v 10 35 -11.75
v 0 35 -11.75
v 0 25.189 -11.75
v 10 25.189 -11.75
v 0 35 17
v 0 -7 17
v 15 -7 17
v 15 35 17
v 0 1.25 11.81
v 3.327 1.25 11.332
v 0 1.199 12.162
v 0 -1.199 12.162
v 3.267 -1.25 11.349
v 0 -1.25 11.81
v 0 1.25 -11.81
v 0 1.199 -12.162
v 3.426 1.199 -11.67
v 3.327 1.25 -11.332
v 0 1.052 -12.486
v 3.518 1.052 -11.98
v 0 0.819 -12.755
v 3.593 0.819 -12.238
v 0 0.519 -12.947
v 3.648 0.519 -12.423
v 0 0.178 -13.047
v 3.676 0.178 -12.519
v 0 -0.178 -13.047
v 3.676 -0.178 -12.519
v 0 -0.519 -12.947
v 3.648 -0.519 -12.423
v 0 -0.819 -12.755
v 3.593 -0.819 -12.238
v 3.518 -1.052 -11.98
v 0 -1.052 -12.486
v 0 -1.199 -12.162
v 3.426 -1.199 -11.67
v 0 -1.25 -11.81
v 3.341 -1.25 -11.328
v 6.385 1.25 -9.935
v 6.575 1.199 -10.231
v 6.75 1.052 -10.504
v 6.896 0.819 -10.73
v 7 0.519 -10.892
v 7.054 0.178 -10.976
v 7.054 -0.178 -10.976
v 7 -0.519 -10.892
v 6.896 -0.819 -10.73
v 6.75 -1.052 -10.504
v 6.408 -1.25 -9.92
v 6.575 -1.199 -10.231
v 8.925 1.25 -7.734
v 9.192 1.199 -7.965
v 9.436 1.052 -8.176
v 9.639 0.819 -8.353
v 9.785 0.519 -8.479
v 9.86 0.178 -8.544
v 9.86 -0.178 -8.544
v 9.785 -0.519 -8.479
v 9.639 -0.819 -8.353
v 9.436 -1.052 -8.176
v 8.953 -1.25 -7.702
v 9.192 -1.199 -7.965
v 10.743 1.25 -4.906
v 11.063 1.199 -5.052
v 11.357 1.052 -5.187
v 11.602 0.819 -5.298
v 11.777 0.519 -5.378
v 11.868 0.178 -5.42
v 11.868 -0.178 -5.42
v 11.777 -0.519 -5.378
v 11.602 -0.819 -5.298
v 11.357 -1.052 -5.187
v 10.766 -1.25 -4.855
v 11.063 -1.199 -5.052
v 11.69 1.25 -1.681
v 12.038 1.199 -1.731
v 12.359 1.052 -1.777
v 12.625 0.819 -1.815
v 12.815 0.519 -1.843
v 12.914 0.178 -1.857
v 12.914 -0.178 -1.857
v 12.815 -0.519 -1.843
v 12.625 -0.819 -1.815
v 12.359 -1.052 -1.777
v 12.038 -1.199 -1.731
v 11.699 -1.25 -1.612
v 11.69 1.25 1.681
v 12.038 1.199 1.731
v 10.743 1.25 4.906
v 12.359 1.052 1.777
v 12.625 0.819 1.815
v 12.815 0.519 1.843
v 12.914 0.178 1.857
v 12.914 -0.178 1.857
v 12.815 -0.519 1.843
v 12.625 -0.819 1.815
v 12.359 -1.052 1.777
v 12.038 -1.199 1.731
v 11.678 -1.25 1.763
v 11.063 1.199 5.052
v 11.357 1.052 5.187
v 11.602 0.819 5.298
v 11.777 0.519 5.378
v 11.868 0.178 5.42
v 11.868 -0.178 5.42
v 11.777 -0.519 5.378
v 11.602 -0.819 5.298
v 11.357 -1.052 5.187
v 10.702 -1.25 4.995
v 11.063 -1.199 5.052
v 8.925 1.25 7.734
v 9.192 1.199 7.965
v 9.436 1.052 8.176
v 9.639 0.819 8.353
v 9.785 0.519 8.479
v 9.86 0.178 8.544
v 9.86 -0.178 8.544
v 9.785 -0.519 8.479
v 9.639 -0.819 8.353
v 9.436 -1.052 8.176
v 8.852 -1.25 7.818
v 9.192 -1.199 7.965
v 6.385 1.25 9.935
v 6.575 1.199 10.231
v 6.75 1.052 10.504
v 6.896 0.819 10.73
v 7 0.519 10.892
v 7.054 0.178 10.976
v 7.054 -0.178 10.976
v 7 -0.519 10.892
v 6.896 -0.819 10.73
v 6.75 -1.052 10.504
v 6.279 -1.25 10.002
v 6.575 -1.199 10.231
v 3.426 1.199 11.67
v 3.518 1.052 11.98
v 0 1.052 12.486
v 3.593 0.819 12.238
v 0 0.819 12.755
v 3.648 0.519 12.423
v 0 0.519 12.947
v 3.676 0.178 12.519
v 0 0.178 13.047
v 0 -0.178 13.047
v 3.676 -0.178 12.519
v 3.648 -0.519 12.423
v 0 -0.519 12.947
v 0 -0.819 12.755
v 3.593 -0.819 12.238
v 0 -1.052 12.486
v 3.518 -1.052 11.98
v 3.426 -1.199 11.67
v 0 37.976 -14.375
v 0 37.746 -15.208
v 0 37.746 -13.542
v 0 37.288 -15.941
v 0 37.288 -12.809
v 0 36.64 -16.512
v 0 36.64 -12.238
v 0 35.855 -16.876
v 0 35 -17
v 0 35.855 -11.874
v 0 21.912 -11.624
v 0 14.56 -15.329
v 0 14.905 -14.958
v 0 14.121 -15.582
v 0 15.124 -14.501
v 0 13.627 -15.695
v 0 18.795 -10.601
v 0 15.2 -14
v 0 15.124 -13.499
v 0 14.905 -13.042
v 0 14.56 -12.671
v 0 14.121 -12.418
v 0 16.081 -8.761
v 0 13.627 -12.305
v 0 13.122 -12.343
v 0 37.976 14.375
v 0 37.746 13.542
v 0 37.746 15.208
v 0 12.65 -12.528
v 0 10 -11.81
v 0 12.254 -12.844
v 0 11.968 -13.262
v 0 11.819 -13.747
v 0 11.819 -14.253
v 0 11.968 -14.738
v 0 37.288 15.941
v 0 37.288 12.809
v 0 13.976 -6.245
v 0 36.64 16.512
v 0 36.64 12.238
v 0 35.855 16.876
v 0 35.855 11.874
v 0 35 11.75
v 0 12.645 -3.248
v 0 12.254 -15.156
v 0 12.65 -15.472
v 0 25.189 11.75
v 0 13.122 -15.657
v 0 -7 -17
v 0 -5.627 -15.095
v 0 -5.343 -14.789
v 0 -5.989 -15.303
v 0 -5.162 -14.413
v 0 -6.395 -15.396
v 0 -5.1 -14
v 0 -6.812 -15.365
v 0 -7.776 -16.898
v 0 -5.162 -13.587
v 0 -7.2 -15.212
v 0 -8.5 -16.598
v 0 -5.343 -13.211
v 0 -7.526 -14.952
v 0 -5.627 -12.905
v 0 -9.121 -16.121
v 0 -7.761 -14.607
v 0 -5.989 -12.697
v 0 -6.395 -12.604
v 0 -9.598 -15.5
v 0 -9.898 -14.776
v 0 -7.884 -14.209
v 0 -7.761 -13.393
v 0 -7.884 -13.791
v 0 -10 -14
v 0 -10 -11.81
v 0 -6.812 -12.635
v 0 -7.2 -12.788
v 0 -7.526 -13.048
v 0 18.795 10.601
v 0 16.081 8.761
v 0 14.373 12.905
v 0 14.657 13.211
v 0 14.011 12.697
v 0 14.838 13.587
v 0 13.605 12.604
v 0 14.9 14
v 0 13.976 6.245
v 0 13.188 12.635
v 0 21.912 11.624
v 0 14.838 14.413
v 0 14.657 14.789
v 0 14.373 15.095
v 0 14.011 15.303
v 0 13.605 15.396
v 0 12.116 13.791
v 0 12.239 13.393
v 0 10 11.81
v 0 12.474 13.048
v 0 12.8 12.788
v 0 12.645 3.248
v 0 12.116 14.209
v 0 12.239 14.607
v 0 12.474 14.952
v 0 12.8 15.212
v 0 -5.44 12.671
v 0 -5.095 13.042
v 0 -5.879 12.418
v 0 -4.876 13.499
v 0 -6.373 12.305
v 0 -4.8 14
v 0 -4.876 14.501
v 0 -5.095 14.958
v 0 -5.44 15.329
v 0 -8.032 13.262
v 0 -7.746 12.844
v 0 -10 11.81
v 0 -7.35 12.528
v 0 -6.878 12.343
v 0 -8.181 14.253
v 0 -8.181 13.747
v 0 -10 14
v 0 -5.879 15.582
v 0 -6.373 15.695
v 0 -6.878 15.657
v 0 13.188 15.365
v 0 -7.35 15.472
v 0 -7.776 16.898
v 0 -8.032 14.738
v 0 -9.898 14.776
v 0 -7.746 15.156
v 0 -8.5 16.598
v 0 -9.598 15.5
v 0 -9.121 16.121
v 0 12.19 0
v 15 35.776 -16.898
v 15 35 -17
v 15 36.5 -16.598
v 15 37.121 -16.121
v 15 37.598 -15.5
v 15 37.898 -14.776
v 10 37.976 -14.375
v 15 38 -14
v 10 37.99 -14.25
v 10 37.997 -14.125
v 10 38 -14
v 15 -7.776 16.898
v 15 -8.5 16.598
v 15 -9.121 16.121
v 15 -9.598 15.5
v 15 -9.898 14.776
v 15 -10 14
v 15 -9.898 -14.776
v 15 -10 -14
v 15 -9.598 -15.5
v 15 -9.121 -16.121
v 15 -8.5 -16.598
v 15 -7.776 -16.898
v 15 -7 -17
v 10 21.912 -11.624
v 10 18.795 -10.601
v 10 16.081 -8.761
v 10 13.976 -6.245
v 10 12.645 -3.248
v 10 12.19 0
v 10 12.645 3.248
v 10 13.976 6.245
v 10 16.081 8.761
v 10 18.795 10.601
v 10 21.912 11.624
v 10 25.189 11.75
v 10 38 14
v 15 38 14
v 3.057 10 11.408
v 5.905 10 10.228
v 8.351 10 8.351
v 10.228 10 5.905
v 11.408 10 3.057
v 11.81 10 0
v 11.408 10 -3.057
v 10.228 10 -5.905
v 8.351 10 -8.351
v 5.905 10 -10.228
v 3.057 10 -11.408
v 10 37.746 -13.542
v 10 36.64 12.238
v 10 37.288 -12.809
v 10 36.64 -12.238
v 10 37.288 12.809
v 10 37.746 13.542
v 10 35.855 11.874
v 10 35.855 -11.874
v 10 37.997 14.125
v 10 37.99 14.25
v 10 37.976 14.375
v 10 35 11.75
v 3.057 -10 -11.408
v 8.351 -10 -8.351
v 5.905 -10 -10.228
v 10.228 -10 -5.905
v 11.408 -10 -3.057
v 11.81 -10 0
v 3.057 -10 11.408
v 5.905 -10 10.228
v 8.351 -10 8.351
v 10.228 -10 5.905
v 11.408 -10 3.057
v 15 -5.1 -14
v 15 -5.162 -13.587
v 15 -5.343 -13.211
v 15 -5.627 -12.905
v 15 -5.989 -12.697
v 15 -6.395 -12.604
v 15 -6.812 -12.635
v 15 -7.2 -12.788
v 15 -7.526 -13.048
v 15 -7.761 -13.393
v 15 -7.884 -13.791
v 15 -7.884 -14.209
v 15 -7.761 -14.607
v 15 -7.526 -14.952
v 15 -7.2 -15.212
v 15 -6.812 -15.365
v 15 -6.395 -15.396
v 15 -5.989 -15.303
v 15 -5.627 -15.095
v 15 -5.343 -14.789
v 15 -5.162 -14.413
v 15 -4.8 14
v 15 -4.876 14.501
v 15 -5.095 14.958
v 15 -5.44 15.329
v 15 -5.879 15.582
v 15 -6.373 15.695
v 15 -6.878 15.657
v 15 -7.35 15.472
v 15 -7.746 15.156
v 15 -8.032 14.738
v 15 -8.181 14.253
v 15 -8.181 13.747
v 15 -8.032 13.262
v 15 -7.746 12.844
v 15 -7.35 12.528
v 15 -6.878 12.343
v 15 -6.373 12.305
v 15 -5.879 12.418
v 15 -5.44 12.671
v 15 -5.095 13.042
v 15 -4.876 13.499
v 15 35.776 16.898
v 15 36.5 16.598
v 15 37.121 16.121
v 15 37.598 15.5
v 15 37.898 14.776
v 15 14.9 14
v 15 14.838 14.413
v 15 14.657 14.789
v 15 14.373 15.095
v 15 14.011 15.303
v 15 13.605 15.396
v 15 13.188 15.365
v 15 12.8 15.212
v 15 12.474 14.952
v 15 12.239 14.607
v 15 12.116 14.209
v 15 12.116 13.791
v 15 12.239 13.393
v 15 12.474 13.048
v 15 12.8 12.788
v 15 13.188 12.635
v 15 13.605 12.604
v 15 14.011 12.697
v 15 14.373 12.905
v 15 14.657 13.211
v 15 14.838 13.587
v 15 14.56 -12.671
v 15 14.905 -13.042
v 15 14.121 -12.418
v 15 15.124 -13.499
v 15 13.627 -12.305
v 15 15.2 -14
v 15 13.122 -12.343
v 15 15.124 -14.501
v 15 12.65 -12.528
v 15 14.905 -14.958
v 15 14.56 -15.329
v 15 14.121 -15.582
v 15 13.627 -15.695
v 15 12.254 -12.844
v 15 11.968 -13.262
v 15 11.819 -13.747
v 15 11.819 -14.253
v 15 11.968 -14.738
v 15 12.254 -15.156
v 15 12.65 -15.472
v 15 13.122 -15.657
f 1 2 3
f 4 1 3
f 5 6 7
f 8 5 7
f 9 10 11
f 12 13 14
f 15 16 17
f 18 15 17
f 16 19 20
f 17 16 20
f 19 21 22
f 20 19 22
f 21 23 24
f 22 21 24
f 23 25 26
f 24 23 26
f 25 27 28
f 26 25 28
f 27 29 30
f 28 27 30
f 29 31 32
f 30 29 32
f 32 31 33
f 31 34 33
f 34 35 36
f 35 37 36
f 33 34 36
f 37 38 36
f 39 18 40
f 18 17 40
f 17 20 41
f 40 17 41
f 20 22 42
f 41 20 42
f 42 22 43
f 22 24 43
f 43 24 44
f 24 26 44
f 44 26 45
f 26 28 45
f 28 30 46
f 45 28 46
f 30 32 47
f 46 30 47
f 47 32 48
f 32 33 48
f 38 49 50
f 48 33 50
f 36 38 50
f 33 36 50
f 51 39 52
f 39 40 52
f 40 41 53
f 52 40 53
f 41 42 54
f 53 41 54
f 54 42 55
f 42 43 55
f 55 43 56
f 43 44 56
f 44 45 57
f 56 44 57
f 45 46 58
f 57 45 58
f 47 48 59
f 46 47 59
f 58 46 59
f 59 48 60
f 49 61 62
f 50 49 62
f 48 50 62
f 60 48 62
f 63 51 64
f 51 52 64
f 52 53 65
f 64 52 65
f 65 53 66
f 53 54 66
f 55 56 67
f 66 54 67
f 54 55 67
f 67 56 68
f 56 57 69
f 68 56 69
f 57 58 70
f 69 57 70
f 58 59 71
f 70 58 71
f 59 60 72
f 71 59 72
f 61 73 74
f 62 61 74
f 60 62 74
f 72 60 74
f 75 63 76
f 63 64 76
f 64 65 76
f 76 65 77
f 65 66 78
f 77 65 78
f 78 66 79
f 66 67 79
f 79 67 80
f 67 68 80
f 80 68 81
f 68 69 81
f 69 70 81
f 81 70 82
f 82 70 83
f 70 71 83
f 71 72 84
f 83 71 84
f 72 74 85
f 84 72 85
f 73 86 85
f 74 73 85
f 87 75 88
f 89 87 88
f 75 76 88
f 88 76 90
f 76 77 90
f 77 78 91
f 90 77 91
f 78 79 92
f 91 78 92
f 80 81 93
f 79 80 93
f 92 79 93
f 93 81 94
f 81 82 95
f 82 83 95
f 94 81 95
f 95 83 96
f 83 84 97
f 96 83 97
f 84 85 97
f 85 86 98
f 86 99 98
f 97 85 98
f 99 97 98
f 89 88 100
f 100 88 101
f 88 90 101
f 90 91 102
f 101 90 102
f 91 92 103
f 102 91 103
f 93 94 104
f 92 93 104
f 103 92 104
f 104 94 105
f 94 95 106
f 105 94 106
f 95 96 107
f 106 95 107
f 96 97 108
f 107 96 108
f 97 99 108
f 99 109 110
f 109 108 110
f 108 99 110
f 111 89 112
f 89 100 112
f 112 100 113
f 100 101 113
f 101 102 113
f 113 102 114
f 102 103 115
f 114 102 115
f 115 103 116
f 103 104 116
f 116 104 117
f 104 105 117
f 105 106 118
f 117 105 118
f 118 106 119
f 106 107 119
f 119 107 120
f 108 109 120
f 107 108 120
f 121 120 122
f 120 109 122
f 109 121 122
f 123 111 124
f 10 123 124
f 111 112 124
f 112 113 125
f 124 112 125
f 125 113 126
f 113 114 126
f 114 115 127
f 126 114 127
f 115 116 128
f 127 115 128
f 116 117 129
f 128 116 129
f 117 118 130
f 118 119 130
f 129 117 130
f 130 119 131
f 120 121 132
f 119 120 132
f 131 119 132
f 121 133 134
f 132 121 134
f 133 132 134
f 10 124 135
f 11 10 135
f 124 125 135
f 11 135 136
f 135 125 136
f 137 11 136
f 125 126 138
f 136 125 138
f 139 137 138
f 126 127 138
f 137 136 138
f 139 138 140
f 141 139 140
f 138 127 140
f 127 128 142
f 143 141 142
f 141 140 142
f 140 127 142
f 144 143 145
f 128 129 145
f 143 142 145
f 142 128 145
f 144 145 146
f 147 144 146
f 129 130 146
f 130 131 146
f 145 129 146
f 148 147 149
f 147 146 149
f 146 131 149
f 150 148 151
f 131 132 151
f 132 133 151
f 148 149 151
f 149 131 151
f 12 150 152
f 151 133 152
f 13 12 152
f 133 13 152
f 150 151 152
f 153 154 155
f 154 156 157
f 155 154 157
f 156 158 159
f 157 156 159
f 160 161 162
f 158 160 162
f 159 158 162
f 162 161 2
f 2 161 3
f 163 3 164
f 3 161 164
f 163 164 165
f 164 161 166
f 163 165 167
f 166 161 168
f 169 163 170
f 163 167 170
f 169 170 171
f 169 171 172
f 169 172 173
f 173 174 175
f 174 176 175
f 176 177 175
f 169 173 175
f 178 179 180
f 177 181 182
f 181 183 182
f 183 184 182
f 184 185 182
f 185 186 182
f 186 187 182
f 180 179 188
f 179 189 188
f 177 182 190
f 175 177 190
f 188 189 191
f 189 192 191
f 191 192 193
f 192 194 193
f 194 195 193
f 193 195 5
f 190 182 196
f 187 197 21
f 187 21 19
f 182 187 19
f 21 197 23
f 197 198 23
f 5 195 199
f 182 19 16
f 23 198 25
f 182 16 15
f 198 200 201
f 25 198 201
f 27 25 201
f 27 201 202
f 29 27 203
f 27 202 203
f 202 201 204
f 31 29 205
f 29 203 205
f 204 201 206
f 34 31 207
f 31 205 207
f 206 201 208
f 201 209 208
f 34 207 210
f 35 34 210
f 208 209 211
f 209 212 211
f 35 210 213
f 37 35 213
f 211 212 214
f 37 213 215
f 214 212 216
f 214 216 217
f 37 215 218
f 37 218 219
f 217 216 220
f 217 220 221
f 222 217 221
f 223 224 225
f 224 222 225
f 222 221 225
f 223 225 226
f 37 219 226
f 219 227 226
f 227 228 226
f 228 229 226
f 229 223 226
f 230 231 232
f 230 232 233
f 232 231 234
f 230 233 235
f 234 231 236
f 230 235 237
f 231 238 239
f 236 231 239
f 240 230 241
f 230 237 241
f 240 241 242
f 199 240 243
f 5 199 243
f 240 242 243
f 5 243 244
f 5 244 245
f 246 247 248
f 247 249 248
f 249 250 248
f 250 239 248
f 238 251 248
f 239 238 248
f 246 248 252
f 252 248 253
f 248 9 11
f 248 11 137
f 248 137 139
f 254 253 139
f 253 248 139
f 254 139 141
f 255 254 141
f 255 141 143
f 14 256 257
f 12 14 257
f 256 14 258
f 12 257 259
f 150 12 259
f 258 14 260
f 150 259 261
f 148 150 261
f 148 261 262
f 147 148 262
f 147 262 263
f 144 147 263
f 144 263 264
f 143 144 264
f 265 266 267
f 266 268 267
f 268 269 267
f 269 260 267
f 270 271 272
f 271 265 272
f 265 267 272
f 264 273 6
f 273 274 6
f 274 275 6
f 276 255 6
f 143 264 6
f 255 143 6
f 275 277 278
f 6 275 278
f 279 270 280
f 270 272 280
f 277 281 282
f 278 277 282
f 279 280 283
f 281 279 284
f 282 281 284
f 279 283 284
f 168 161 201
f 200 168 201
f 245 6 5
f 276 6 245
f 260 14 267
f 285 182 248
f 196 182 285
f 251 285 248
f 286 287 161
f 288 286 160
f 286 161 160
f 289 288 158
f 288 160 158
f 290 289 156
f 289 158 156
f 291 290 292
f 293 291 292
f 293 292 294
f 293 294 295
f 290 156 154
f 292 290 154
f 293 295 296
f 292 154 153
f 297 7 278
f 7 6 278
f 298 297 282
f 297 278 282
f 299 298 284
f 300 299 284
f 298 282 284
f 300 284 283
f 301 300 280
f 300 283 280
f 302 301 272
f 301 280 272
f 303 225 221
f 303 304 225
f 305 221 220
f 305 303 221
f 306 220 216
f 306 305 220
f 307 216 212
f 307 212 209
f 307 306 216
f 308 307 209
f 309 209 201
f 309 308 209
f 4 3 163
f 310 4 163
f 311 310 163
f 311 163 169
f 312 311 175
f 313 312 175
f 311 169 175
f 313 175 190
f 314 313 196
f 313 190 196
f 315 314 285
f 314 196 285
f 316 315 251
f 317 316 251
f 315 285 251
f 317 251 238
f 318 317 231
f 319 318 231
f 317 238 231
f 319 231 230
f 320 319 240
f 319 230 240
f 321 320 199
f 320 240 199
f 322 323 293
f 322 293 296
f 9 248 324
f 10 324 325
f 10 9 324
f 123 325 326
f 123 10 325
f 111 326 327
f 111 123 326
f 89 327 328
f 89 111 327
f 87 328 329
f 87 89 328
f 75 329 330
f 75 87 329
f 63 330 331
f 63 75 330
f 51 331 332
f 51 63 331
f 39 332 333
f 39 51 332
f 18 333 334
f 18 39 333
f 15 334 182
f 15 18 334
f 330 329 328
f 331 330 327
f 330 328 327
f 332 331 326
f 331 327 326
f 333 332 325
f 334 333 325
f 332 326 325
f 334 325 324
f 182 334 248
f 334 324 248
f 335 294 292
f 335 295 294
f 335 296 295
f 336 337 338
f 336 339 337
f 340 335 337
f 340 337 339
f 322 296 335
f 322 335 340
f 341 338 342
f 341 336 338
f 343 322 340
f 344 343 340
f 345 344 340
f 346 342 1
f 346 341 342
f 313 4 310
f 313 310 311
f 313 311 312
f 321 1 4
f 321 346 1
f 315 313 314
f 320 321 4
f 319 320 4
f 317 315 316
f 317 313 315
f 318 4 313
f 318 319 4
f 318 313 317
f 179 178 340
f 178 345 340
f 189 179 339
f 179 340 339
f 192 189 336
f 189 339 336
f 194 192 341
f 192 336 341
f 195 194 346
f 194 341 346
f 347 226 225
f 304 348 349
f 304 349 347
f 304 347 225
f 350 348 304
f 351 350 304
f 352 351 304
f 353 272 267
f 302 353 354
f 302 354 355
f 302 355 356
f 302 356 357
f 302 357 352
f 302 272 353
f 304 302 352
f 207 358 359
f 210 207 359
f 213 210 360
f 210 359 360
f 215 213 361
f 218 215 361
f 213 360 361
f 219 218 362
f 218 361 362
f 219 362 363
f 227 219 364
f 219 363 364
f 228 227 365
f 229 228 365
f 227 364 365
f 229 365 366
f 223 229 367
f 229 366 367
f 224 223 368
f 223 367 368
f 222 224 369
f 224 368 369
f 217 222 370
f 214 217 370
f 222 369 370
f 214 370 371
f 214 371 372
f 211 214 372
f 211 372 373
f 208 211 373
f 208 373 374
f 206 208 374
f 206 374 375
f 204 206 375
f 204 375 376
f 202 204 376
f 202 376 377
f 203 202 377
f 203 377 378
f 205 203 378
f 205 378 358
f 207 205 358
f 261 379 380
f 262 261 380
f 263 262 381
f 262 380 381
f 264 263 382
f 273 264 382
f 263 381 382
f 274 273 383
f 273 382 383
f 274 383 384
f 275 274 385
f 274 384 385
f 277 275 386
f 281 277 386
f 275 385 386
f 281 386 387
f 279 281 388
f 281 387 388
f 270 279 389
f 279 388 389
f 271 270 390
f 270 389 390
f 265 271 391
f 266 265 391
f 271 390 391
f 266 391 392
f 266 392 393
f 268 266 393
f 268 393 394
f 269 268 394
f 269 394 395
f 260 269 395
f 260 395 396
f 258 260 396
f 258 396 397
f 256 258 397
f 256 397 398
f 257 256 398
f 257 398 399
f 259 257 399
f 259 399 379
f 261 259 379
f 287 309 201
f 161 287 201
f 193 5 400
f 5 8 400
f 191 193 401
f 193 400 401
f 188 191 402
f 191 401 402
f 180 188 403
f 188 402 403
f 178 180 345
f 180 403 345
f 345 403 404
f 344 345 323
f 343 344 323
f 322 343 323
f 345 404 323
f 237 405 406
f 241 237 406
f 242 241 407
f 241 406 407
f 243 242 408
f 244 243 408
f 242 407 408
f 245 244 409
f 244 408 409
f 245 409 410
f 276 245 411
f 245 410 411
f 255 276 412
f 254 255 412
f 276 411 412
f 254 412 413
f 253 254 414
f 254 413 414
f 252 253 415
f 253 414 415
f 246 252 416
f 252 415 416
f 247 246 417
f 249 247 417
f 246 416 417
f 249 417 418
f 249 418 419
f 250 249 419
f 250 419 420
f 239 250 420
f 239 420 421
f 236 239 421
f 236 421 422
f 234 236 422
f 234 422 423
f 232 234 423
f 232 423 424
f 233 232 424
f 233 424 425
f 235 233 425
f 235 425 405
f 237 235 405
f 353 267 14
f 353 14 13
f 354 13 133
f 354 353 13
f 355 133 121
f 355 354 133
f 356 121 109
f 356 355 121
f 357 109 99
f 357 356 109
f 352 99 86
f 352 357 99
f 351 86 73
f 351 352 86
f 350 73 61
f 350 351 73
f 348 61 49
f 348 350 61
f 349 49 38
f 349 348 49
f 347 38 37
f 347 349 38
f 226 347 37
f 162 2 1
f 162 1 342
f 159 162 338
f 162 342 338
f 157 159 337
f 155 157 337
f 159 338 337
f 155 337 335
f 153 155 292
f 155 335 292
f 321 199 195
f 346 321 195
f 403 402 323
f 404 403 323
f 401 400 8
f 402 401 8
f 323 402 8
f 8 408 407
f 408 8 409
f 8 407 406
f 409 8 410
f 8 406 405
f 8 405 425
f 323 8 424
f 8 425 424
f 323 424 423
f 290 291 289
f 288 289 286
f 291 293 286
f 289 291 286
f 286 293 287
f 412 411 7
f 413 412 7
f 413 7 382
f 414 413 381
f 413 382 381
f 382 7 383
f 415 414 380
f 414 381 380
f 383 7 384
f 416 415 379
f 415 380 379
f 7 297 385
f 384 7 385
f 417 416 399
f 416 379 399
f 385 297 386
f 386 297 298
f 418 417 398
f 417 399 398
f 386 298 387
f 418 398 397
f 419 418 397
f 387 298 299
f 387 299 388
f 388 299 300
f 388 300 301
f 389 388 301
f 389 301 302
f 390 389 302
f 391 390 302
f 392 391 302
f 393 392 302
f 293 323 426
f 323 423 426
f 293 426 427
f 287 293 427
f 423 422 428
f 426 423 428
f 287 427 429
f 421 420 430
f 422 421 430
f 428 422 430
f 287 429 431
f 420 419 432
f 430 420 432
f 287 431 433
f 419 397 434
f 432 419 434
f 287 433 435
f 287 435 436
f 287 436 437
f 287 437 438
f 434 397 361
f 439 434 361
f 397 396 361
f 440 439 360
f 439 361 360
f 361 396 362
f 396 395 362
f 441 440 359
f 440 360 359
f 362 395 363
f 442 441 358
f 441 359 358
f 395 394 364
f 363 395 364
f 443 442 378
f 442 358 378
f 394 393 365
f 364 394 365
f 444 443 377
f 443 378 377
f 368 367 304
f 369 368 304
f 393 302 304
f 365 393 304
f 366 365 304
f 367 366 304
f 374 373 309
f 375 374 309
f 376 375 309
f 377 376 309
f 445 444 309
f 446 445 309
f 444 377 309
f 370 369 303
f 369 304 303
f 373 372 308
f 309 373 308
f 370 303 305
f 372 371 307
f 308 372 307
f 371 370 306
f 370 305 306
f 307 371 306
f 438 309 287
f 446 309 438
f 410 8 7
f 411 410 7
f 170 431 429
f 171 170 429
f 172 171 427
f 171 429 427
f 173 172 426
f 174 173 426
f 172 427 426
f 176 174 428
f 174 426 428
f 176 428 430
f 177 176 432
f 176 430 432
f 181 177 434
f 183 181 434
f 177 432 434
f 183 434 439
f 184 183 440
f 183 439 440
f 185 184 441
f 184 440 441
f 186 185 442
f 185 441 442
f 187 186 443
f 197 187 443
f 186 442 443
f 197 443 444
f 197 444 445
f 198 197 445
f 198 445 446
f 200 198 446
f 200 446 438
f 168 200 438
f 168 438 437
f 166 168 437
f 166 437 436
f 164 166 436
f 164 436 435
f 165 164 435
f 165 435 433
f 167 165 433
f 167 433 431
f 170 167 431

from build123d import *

# Parameters (mm, degrees)
F1_DEPTH      = 10
F1_DEPTH_BACK = 10
F5_DEPTH      = 28
F8_D          = 2.8
F8_ON_F2_D    = 2.8
F9_D          = 3.4
F9_ON_F2_D    = 3.4
F10_DEPTH     = 10
F11_F1_R      = 3
F11_F2_R      = 3
F11_F3_R      = 3
F11_F4_R      = 3
F11_F5_R      = 3
F11_F6_R      = 3
F12_DEPTH     = 10


with BuildPart() as f1:
    # F0 (on Front) → F1 (new body, two sides)
    with BuildSketch(Plane.XZ) as f1_sk:
        with BuildLine():
            Line((15, 17), (0, 17))
            Line((0, 17), (0, 11.81))
            ThreePointArc((0, 11.81), (8.3509310858, 8.3509310858), (11.81, 0))
            ThreePointArc((11.81, 0), (8.3509310858, -8.3509310858), (0, -11.81))
            Line((0, -11.81), (0, -17))
            Line((0, -17), (15, -17))
            Line((15, -17), (15, 17))
        make_face()
    extrude(amount=F1_DEPTH)
    extrude(f1_sk.sketch, amount=-F1_DEPTH_BACK)

    # F2 (on face) → F3 (revolve, cut)
    with BuildSketch(Plane(origin=(0, 0, 0), x_dir=(0, -1, 0), z_dir=(-1, 0, 0))):
        with BuildLine():
            Line((-1.25, -11.81), (1.25, -11.81))
            ThreePointArc((1.25, -11.81), (0, -10.56), (-1.25, -11.81))
        make_face()
        with BuildLine():
            ThreePointArc((-1.25, -11.81), (0, -13.06), (1.25, -11.81))
            Line((1.25, -11.81), (-1.25, -11.81))
        make_face()
    revolve(axis=Axis((0, 0, 0), (0, -1, 0)), mode=Mode.SUBTRACT)

    # F4 (on face) → F5 (join)
    with BuildSketch(Plane(origin=(0, 10, 0), x_dir=(-1, 0, 0), z_dir=(0, 1, 0))):
        with BuildLine():
            Line((0, -11.81), (0, 11.81))
            ThreePointArc((0, 11.81), (-11.81, 0), (0, -11.81))
        make_face()
        with BuildLine():
            Line((0, 17), (-15, 17))
            Line((-15, 17), (-15, -17))
            Line((-15, -17), (0, -17))
            Line((0, -17), (0, -11.81))
            ThreePointArc((0, -11.81), (-11.81, 0), (0, 11.81))
            Line((0, 11.81), (0, 17))
        make_face()
    extrude(amount=F5_DEPTH)

    # F6: union 

    # F8 (through all)
    with Locations(Plane(origin=(0, 0, 0), x_dir=(0, -1, 0), z_dir=(-1, 0, 0))):
        with Locations((-13.5, 14)):
            Hole(F8_D / 2)

    # F8 on F2 (through all)
    with Locations(Plane(origin=(0, 0, 0), x_dir=(0, -1, 0), z_dir=(-1, 0, 0))):
        with Locations((6.5, -14)):
            Hole(F8_ON_F2_D / 2)

    # F9 (through all)
    with Locations(Plane(origin=(0, 0, 0), x_dir=(0, -1, 0), z_dir=(-1, 0, 0))):
        with Locations((-13.5, -14)):
            Hole(F9_D / 2)

    # F9 on F2 (through all)
    with Locations(Plane(origin=(0, 0, 0), x_dir=(0, -1, 0), z_dir=(-1, 0, 0))):
        with Locations((6.5, 14)):
            Hole(F9_ON_F2_D / 2)

    # F7 (on face) → F10 (cut)
    with BuildSketch(Plane(origin=(0, 0, 0), x_dir=(0, -1, 0), z_dir=(-1, 0, 0))):
        with BuildLine():
            Line((-38, 11.75), (-38, -11.75))
            Line((-38, -11.75), (-25.1889491158, -11.75))
            ThreePointArc((-25.1889491158, -11.75), (-35.81, 0), (-25.1889491158, 11.75))
            Line((-25.1889491158, 11.75), (-38, 11.75))
        make_face()
        with BuildLine():
            ThreePointArc((-25.1889491158, 11.75), (-35.81, 0), (-25.1889491158, -11.75))
            Line((-25.1889491158, -11.75), (-24, -11.75))
            Line((-24, -11.75), (-24, 11.75))
            Line((-24, 11.75), (-25.1889491158, 11.75))
        make_face()
    extrude(amount=-F10_DEPTH, mode=Mode.SUBTRACT)

    # F11: fillet of radius 3 on 6 edges, made by hand

    # F11_f1
    f11_f1_edges = [f1.edges().sort_by_distance(p)[0] for p in [
        (5, 38, 11.75),
    ]]
    fillet(f11_f1_edges, radius=F11_F1_R)

    # F11_f2
    f11_f2_edges = [f1.edges().sort_by_distance(p)[0] for p in [
        (5, 38, -11.75),
    ]]
    fillet(f11_f2_edges, radius=F11_F2_R)

    # F11_f3
    f11_f3_edges = [f1.edges().sort_by_distance(p)[0] for p in [
        (7.5, -10, 17),
    ]]
    fillet(f11_f3_edges, radius=F11_F3_R)

    # F11_f4
    f11_f4_edges = [f1.edges().sort_by_distance(p)[0] for p in [
        (7.5, 38, 17),
    ]]
    fillet(f11_f4_edges, radius=F11_F4_R)

    # F11_f5
    f11_f5_edges = [f1.edges().sort_by_distance(p)[0] for p in [
        (7.5, -10, -17),
    ]]
    fillet(f11_f5_edges, radius=F11_F5_R)

    # F11_f6
    f11_f6_edges = [f1.edges().sort_by_distance(p)[0] for p in [
        (7.5, 38, -17),
    ]]
    fillet(f11_f6_edges, radius=F11_F6_R)

    # F7 (on face) → F12 (cut)
    with BuildSketch(Plane(origin=(0, 0, 0), x_dir=(0, -1, 0), z_dir=(-1, 0, 0))):
        with BuildLine():
            Line((-24, -11.75), (-25.1889491158, -11.75))
            ThreePointArc((-25.1889491158, -11.75), (-16.0805741704, -8.7612096499), (-12.19, 0))
            ThreePointArc((-12.19, 0), (-16.0805741704, 8.7612096499), (-25.1889491158, 11.75))
            Line((-25.1889491158, 11.75), (-24, 11.75))
            Line((-24, 11.75), (-24, -11.75))
        make_face()
    extrude(amount=-F12_DEPTH, mode=Mode.SUBTRACT)


solid = f1.part
